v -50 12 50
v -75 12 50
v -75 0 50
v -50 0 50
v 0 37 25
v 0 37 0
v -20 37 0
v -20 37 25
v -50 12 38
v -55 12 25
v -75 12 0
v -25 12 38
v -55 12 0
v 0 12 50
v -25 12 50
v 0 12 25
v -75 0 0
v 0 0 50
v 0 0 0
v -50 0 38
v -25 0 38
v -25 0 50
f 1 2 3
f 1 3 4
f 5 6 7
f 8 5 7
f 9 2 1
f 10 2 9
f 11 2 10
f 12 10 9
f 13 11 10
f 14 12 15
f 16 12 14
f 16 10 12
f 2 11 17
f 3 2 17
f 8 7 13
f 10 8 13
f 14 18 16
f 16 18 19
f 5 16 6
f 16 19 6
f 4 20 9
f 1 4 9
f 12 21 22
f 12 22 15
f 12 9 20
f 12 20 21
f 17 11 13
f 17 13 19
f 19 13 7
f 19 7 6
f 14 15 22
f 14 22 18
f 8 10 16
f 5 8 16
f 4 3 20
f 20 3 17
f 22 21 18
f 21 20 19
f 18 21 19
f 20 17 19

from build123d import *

# Parameters (mm, degrees)
BOSS_EXTRUDE1_DEPTH = 25
SKETCH1_3_W         = 25
SKETCH1_3_H         = 12
BOSS_EXTRUDE2_DEPTH = 50
SKETCH1_4_W         = 25
SKETCH1_4_H         = 12
BOSS_EXTRUDE3_DEPTH = 38


with BuildPart() as part:
    # Sketch1 → Boss-Extrude1 (new body)
    with BuildSketch(Plane.XY):
        Polygon((-25, 12), (0, 12), (0, 37), (-20, 37), (-55, 12), (-50, 12), align=None)
    extrude(amount=BOSS_EXTRUDE1_DEPTH)

    # Sketch1<3> → Boss-Extrude2 (add)
    with BuildSketch(Plane.XY):
        with Locations((-12.5, 6)):
            Rectangle(SKETCH1_3_W, SKETCH1_3_H)
        with Locations((-62.5, 6)):
            Rectangle(SKETCH1_3_W, SKETCH1_3_H)
    extrude(amount=BOSS_EXTRUDE2_DEPTH)

    # Sketch1<4> → Boss-Extrude3 (add)
    with BuildSketch(Plane.XY):
        with Locations((-37.5, 6)):
            Rectangle(SKETCH1_4_W, SKETCH1_4_H)
    extrude(amount=BOSS_EXTRUDE3_DEPTH)


solid = part.part
